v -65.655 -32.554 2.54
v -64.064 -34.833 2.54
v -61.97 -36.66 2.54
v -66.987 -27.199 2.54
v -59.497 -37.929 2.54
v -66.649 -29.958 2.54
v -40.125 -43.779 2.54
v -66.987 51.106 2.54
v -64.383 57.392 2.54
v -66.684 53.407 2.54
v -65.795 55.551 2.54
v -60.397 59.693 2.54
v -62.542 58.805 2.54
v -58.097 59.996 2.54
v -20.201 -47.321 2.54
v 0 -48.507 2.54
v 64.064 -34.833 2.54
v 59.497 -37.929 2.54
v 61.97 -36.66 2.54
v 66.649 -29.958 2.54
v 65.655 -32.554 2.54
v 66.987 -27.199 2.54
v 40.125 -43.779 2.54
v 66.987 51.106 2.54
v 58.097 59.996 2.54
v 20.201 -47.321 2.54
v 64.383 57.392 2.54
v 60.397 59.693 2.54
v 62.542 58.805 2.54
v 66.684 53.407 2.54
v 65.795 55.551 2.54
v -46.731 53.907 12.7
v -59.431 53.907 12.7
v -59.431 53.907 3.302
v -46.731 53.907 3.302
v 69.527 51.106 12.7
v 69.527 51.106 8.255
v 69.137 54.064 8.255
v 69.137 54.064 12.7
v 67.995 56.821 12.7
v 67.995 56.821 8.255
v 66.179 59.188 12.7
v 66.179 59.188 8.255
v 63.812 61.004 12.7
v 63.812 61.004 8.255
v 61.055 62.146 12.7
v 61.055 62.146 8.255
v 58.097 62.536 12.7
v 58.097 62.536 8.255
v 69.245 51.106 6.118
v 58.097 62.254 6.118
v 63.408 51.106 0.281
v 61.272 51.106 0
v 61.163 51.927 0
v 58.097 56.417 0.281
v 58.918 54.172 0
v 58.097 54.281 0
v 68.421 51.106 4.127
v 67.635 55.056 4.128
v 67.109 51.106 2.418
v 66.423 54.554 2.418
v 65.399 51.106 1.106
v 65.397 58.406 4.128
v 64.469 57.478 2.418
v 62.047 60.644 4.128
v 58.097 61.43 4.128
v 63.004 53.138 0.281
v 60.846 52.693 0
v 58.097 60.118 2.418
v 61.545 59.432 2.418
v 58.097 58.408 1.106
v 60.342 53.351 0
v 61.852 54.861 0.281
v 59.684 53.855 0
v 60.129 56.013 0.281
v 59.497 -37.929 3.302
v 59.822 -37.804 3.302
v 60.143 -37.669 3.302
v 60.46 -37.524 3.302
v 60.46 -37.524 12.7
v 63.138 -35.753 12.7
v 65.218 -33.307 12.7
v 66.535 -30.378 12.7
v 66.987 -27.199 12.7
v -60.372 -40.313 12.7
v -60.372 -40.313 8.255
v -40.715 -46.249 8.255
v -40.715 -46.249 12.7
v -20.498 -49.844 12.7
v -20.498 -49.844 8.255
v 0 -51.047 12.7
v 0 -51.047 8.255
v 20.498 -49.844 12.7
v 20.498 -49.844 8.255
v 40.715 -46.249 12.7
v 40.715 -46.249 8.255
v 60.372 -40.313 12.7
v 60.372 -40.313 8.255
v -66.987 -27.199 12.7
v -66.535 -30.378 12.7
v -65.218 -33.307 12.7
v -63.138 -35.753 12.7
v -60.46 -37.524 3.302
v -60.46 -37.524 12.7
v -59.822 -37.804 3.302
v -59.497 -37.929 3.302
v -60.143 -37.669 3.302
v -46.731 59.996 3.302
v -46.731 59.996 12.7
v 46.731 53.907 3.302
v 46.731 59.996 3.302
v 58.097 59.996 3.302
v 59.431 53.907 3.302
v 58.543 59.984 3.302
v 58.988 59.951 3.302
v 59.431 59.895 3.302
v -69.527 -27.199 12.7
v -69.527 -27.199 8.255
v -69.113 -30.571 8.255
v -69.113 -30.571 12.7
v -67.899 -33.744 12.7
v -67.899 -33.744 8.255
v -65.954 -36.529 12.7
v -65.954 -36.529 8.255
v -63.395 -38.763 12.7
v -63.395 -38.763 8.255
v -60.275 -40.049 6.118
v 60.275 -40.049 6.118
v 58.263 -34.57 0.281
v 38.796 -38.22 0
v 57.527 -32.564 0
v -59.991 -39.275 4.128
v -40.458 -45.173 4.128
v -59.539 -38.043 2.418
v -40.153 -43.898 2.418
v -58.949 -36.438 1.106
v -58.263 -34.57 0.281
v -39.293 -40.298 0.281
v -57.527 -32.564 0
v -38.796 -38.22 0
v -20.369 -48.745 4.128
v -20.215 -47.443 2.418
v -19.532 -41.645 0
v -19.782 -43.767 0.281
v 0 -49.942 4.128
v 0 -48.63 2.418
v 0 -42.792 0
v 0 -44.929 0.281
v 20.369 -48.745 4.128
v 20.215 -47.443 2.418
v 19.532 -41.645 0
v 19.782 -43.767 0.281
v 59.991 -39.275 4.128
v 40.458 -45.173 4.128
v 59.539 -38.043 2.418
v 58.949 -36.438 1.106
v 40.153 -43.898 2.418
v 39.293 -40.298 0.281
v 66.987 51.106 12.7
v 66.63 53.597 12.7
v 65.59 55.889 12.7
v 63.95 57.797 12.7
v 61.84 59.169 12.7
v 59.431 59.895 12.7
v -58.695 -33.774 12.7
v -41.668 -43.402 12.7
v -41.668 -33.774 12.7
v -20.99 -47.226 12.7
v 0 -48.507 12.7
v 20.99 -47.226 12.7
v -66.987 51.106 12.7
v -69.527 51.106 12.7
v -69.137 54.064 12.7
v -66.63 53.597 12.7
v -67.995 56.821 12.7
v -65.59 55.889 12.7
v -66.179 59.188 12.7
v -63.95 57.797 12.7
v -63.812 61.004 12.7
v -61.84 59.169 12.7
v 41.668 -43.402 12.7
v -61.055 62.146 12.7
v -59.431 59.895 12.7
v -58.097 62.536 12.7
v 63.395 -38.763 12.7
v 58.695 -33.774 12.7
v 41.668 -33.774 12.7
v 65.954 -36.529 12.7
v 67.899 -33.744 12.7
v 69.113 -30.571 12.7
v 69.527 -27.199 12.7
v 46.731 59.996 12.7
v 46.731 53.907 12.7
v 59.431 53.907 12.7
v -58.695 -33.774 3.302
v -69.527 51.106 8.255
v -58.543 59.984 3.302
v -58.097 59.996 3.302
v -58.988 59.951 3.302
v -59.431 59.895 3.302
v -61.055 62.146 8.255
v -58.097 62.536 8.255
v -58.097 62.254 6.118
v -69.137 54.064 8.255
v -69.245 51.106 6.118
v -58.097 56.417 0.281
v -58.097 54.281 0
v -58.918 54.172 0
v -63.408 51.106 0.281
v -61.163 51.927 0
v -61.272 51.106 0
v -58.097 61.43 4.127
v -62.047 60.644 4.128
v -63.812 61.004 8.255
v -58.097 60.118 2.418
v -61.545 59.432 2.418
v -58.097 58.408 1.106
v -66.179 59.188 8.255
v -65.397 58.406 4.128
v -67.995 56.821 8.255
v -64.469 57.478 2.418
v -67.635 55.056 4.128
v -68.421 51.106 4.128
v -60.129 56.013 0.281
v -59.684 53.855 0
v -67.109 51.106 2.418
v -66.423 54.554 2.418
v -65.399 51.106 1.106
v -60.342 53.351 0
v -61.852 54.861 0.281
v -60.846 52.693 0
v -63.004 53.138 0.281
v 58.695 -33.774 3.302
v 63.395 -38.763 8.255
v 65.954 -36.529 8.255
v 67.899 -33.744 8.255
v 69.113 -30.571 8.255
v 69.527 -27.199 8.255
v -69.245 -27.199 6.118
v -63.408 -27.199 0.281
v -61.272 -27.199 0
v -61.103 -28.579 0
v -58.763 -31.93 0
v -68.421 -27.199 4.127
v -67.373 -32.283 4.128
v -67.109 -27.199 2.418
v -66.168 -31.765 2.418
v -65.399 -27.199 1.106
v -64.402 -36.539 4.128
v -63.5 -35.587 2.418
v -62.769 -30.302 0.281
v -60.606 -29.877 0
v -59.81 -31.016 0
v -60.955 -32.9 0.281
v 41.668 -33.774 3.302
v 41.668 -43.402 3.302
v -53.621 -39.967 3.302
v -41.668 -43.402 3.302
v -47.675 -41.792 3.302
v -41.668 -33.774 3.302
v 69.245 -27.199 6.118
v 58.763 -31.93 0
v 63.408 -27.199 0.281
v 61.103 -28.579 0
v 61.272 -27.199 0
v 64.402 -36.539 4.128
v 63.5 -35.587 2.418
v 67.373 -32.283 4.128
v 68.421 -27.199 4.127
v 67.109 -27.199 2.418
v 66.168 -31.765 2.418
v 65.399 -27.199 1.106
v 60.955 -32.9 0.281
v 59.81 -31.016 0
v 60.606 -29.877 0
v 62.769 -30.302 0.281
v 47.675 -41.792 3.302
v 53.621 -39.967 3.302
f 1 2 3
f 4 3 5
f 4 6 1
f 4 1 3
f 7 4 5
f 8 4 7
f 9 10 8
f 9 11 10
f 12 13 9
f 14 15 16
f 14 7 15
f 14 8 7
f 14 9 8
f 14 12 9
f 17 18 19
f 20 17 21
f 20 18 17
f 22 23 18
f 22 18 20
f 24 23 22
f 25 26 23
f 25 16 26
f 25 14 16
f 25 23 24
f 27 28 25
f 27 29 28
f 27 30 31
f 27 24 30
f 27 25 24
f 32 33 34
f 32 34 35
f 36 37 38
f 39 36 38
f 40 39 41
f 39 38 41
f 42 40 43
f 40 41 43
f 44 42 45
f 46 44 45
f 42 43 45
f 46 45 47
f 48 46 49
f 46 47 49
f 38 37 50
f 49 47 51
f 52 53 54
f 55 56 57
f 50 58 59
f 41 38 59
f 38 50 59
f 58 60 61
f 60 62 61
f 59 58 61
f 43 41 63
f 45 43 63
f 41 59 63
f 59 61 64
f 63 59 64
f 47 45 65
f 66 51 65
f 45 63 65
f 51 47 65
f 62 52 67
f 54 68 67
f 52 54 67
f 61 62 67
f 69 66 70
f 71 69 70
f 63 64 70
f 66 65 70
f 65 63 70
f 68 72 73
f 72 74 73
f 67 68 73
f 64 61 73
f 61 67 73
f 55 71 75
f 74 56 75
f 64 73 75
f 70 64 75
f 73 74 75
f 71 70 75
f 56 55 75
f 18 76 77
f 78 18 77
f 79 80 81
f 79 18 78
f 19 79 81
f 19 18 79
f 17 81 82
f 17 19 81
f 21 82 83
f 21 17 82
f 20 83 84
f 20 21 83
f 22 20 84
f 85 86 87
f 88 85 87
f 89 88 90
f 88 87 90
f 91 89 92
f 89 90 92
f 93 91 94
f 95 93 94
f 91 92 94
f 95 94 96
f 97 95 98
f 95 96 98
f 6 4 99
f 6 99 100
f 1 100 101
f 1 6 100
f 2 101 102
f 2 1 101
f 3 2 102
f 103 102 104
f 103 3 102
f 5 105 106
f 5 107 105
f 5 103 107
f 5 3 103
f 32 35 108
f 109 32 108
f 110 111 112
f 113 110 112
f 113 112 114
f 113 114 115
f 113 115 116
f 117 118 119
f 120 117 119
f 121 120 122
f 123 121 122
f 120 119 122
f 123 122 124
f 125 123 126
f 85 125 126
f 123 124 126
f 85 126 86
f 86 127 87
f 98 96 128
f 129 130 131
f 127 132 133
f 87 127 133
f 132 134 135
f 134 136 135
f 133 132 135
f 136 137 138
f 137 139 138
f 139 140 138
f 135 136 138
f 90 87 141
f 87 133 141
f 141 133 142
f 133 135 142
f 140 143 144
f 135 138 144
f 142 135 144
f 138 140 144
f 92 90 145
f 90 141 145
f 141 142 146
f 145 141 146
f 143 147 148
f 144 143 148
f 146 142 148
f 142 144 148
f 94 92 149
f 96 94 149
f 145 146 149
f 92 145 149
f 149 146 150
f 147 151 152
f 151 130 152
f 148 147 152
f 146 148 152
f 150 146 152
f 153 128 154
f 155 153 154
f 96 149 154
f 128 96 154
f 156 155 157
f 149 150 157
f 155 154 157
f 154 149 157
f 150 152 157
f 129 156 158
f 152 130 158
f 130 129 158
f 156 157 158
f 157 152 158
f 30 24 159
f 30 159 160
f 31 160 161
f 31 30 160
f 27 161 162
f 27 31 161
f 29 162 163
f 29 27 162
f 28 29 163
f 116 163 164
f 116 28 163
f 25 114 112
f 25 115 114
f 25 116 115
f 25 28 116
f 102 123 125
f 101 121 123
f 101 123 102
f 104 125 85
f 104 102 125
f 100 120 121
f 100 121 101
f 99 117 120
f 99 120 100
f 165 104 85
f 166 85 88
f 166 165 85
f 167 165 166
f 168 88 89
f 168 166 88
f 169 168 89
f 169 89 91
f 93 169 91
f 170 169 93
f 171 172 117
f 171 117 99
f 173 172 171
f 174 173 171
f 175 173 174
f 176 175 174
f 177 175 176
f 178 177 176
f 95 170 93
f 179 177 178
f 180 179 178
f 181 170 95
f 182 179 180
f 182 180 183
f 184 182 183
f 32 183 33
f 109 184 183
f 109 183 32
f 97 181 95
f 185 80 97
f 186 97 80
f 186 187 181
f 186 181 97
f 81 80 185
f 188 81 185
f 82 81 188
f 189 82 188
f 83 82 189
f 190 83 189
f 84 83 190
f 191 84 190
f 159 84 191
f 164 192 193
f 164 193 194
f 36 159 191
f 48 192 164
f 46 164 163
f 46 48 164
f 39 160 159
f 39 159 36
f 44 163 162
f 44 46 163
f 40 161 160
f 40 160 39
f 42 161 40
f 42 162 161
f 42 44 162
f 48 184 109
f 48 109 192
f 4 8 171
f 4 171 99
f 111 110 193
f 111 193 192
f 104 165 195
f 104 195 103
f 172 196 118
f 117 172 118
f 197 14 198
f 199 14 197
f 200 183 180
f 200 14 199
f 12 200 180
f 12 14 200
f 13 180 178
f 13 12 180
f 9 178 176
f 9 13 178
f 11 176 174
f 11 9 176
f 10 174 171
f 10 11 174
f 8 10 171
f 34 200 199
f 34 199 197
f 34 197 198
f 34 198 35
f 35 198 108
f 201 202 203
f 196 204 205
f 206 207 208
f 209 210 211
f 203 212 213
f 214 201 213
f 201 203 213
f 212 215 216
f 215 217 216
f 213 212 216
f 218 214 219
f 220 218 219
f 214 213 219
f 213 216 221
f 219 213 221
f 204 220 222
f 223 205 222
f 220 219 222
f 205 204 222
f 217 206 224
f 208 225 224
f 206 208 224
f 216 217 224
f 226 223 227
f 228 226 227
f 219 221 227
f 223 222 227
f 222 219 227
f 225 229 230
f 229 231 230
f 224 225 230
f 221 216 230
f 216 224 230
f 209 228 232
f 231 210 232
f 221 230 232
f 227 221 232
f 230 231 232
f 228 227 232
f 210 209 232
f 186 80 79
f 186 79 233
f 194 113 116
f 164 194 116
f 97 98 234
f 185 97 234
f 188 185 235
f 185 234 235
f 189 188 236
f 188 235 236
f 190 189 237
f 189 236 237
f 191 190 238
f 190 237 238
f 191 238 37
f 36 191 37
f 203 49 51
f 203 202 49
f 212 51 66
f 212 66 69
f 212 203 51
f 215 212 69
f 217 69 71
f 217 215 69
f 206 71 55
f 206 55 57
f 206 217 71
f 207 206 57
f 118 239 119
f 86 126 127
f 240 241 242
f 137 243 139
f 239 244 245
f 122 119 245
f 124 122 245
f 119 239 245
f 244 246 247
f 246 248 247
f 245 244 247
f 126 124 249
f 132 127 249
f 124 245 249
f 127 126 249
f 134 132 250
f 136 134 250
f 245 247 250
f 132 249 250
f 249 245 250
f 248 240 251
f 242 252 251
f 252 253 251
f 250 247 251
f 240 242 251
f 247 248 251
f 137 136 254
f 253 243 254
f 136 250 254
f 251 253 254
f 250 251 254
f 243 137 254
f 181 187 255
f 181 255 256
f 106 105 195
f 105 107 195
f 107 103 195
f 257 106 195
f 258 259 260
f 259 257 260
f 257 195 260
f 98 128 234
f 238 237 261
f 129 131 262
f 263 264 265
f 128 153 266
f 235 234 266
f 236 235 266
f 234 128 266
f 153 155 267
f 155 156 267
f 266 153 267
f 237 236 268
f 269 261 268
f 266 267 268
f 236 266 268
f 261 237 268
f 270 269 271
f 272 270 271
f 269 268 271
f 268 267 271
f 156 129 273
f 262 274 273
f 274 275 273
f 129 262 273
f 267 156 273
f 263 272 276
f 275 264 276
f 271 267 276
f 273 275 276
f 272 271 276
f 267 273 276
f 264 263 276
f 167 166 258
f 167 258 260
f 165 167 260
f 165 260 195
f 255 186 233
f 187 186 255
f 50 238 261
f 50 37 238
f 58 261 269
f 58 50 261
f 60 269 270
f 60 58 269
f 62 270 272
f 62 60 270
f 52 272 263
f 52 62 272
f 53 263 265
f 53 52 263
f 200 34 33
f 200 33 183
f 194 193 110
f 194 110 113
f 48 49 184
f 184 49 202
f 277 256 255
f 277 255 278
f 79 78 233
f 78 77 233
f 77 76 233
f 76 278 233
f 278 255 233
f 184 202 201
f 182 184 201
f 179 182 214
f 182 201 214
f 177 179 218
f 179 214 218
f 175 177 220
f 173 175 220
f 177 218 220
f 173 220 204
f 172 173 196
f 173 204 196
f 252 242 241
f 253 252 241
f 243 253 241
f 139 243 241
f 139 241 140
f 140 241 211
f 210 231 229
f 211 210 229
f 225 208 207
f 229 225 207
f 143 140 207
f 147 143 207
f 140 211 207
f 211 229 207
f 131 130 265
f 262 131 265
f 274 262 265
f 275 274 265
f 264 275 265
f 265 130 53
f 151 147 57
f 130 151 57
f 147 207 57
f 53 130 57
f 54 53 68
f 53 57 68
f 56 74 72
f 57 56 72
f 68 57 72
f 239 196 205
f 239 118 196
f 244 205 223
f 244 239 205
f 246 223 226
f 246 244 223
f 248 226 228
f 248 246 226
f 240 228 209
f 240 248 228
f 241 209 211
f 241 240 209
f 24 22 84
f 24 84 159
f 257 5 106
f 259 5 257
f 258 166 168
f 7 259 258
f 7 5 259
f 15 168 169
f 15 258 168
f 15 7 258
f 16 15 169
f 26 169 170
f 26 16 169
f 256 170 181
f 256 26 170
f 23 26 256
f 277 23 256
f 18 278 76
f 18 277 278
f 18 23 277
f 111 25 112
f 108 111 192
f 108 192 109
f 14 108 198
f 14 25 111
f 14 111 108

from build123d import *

# Parameters (mm, degrees)
F1_DEPTH = 12.7
F2_T     = -2.54
F3_R     = 8.255
F5_W     = 12.7
F5_H     = 6.35
F6_DEPTH = 9.398


# Not quite as in the source:
# - a feature names something its author has since deleted; it is built from what else it names


with BuildPart() as f1:
    # F0 (on Top) → F1 (new body)
    with BuildSketch(Plane.XY):
        with BuildLine():
            Line((58.0965084505, 62.5356453779), (-58.0965084505, 62.5356453779))
            ThreePointArc((-58.0965084505, 62.5356453779), (-66.1787389595, 59.1878758868), (-69.5265084505, 51.1056453779))
            Line((-69.5265084505, 51.1056453779), (-69.5265084505, -27.1992570698))
            ThreePointArc((-69.5265084505, -27.1992570698), (-67.0115325937, -35.1957139026), (-60.3721316603, -40.3130159932))
            ThreePointArc((-60.3721316603, -40.3130159932), (0, -51.0474727306), (60.3721316603, -40.3130159932))
            ThreePointArc((60.3721316603, -40.3130159932), (67.0115325937, -35.1957139026), (69.5265084505, -27.1992570698))
            Line((69.5265084505, -27.1992570698), (69.5265084505, 51.1056453779))
            ThreePointArc((69.5265084505, 51.1056453779), (66.1787389595, 59.1878758868), (58.0965084505, 62.5356453779))
        make_face()
    extrude(amount=F1_DEPTH)

    # F2
    f2_openings = [f1.faces().sort_by_distance(p)[0] for p in [
        (0, 7.919531, 12.7),
    ]]
    offset(amount=F2_T, openings=f2_openings)

    # F3
    f3_edges = [f1.edges().sort_by_distance(p)[0] for p in [
        (69.526508, 11.953194, 0),
        (66.178739, 59.187876, 0),
        (0, 62.535645, 0),
        (-66.178739, 59.187876, 0),
        (-69.526508, 11.953194, 0),
        (-67.011533, -35.195714, 0),
        (0, -51.047473, 0),
        (67.011533, -35.195714, 0),
    ]]
    fillet(f3_edges, radius=F3_R)

    # F5 (on offset) → F6 (join)
    with BuildSketch(Plane.XY.offset(12.7)):
        with Locations((-53.0805146158, 57.0815077901)):
            Rectangle(F5_W, F5_H)
        with Locations((53.0805146158, 57.0815077901)):
            Rectangle(F5_W, F5_H)
        Polygon((-41.6677072644, -33.773638308), (-58.6946308613, -33.773638308), (-60.6418885291, -37.9110425711), (-53.9016760886, -40.266495198), (-41.6677072644, -43.4330925345), align=None)
        Polygon((60.6418885291, -37.9110425711), (58.6946308613, -33.773638308), (41.6677072644, -33.773638308), (41.6677072644, -43.4330925345), (53.9016760886, -40.266495198), align=None)
    extrude(amount=-F6_DEPTH)


solid = f1.part
